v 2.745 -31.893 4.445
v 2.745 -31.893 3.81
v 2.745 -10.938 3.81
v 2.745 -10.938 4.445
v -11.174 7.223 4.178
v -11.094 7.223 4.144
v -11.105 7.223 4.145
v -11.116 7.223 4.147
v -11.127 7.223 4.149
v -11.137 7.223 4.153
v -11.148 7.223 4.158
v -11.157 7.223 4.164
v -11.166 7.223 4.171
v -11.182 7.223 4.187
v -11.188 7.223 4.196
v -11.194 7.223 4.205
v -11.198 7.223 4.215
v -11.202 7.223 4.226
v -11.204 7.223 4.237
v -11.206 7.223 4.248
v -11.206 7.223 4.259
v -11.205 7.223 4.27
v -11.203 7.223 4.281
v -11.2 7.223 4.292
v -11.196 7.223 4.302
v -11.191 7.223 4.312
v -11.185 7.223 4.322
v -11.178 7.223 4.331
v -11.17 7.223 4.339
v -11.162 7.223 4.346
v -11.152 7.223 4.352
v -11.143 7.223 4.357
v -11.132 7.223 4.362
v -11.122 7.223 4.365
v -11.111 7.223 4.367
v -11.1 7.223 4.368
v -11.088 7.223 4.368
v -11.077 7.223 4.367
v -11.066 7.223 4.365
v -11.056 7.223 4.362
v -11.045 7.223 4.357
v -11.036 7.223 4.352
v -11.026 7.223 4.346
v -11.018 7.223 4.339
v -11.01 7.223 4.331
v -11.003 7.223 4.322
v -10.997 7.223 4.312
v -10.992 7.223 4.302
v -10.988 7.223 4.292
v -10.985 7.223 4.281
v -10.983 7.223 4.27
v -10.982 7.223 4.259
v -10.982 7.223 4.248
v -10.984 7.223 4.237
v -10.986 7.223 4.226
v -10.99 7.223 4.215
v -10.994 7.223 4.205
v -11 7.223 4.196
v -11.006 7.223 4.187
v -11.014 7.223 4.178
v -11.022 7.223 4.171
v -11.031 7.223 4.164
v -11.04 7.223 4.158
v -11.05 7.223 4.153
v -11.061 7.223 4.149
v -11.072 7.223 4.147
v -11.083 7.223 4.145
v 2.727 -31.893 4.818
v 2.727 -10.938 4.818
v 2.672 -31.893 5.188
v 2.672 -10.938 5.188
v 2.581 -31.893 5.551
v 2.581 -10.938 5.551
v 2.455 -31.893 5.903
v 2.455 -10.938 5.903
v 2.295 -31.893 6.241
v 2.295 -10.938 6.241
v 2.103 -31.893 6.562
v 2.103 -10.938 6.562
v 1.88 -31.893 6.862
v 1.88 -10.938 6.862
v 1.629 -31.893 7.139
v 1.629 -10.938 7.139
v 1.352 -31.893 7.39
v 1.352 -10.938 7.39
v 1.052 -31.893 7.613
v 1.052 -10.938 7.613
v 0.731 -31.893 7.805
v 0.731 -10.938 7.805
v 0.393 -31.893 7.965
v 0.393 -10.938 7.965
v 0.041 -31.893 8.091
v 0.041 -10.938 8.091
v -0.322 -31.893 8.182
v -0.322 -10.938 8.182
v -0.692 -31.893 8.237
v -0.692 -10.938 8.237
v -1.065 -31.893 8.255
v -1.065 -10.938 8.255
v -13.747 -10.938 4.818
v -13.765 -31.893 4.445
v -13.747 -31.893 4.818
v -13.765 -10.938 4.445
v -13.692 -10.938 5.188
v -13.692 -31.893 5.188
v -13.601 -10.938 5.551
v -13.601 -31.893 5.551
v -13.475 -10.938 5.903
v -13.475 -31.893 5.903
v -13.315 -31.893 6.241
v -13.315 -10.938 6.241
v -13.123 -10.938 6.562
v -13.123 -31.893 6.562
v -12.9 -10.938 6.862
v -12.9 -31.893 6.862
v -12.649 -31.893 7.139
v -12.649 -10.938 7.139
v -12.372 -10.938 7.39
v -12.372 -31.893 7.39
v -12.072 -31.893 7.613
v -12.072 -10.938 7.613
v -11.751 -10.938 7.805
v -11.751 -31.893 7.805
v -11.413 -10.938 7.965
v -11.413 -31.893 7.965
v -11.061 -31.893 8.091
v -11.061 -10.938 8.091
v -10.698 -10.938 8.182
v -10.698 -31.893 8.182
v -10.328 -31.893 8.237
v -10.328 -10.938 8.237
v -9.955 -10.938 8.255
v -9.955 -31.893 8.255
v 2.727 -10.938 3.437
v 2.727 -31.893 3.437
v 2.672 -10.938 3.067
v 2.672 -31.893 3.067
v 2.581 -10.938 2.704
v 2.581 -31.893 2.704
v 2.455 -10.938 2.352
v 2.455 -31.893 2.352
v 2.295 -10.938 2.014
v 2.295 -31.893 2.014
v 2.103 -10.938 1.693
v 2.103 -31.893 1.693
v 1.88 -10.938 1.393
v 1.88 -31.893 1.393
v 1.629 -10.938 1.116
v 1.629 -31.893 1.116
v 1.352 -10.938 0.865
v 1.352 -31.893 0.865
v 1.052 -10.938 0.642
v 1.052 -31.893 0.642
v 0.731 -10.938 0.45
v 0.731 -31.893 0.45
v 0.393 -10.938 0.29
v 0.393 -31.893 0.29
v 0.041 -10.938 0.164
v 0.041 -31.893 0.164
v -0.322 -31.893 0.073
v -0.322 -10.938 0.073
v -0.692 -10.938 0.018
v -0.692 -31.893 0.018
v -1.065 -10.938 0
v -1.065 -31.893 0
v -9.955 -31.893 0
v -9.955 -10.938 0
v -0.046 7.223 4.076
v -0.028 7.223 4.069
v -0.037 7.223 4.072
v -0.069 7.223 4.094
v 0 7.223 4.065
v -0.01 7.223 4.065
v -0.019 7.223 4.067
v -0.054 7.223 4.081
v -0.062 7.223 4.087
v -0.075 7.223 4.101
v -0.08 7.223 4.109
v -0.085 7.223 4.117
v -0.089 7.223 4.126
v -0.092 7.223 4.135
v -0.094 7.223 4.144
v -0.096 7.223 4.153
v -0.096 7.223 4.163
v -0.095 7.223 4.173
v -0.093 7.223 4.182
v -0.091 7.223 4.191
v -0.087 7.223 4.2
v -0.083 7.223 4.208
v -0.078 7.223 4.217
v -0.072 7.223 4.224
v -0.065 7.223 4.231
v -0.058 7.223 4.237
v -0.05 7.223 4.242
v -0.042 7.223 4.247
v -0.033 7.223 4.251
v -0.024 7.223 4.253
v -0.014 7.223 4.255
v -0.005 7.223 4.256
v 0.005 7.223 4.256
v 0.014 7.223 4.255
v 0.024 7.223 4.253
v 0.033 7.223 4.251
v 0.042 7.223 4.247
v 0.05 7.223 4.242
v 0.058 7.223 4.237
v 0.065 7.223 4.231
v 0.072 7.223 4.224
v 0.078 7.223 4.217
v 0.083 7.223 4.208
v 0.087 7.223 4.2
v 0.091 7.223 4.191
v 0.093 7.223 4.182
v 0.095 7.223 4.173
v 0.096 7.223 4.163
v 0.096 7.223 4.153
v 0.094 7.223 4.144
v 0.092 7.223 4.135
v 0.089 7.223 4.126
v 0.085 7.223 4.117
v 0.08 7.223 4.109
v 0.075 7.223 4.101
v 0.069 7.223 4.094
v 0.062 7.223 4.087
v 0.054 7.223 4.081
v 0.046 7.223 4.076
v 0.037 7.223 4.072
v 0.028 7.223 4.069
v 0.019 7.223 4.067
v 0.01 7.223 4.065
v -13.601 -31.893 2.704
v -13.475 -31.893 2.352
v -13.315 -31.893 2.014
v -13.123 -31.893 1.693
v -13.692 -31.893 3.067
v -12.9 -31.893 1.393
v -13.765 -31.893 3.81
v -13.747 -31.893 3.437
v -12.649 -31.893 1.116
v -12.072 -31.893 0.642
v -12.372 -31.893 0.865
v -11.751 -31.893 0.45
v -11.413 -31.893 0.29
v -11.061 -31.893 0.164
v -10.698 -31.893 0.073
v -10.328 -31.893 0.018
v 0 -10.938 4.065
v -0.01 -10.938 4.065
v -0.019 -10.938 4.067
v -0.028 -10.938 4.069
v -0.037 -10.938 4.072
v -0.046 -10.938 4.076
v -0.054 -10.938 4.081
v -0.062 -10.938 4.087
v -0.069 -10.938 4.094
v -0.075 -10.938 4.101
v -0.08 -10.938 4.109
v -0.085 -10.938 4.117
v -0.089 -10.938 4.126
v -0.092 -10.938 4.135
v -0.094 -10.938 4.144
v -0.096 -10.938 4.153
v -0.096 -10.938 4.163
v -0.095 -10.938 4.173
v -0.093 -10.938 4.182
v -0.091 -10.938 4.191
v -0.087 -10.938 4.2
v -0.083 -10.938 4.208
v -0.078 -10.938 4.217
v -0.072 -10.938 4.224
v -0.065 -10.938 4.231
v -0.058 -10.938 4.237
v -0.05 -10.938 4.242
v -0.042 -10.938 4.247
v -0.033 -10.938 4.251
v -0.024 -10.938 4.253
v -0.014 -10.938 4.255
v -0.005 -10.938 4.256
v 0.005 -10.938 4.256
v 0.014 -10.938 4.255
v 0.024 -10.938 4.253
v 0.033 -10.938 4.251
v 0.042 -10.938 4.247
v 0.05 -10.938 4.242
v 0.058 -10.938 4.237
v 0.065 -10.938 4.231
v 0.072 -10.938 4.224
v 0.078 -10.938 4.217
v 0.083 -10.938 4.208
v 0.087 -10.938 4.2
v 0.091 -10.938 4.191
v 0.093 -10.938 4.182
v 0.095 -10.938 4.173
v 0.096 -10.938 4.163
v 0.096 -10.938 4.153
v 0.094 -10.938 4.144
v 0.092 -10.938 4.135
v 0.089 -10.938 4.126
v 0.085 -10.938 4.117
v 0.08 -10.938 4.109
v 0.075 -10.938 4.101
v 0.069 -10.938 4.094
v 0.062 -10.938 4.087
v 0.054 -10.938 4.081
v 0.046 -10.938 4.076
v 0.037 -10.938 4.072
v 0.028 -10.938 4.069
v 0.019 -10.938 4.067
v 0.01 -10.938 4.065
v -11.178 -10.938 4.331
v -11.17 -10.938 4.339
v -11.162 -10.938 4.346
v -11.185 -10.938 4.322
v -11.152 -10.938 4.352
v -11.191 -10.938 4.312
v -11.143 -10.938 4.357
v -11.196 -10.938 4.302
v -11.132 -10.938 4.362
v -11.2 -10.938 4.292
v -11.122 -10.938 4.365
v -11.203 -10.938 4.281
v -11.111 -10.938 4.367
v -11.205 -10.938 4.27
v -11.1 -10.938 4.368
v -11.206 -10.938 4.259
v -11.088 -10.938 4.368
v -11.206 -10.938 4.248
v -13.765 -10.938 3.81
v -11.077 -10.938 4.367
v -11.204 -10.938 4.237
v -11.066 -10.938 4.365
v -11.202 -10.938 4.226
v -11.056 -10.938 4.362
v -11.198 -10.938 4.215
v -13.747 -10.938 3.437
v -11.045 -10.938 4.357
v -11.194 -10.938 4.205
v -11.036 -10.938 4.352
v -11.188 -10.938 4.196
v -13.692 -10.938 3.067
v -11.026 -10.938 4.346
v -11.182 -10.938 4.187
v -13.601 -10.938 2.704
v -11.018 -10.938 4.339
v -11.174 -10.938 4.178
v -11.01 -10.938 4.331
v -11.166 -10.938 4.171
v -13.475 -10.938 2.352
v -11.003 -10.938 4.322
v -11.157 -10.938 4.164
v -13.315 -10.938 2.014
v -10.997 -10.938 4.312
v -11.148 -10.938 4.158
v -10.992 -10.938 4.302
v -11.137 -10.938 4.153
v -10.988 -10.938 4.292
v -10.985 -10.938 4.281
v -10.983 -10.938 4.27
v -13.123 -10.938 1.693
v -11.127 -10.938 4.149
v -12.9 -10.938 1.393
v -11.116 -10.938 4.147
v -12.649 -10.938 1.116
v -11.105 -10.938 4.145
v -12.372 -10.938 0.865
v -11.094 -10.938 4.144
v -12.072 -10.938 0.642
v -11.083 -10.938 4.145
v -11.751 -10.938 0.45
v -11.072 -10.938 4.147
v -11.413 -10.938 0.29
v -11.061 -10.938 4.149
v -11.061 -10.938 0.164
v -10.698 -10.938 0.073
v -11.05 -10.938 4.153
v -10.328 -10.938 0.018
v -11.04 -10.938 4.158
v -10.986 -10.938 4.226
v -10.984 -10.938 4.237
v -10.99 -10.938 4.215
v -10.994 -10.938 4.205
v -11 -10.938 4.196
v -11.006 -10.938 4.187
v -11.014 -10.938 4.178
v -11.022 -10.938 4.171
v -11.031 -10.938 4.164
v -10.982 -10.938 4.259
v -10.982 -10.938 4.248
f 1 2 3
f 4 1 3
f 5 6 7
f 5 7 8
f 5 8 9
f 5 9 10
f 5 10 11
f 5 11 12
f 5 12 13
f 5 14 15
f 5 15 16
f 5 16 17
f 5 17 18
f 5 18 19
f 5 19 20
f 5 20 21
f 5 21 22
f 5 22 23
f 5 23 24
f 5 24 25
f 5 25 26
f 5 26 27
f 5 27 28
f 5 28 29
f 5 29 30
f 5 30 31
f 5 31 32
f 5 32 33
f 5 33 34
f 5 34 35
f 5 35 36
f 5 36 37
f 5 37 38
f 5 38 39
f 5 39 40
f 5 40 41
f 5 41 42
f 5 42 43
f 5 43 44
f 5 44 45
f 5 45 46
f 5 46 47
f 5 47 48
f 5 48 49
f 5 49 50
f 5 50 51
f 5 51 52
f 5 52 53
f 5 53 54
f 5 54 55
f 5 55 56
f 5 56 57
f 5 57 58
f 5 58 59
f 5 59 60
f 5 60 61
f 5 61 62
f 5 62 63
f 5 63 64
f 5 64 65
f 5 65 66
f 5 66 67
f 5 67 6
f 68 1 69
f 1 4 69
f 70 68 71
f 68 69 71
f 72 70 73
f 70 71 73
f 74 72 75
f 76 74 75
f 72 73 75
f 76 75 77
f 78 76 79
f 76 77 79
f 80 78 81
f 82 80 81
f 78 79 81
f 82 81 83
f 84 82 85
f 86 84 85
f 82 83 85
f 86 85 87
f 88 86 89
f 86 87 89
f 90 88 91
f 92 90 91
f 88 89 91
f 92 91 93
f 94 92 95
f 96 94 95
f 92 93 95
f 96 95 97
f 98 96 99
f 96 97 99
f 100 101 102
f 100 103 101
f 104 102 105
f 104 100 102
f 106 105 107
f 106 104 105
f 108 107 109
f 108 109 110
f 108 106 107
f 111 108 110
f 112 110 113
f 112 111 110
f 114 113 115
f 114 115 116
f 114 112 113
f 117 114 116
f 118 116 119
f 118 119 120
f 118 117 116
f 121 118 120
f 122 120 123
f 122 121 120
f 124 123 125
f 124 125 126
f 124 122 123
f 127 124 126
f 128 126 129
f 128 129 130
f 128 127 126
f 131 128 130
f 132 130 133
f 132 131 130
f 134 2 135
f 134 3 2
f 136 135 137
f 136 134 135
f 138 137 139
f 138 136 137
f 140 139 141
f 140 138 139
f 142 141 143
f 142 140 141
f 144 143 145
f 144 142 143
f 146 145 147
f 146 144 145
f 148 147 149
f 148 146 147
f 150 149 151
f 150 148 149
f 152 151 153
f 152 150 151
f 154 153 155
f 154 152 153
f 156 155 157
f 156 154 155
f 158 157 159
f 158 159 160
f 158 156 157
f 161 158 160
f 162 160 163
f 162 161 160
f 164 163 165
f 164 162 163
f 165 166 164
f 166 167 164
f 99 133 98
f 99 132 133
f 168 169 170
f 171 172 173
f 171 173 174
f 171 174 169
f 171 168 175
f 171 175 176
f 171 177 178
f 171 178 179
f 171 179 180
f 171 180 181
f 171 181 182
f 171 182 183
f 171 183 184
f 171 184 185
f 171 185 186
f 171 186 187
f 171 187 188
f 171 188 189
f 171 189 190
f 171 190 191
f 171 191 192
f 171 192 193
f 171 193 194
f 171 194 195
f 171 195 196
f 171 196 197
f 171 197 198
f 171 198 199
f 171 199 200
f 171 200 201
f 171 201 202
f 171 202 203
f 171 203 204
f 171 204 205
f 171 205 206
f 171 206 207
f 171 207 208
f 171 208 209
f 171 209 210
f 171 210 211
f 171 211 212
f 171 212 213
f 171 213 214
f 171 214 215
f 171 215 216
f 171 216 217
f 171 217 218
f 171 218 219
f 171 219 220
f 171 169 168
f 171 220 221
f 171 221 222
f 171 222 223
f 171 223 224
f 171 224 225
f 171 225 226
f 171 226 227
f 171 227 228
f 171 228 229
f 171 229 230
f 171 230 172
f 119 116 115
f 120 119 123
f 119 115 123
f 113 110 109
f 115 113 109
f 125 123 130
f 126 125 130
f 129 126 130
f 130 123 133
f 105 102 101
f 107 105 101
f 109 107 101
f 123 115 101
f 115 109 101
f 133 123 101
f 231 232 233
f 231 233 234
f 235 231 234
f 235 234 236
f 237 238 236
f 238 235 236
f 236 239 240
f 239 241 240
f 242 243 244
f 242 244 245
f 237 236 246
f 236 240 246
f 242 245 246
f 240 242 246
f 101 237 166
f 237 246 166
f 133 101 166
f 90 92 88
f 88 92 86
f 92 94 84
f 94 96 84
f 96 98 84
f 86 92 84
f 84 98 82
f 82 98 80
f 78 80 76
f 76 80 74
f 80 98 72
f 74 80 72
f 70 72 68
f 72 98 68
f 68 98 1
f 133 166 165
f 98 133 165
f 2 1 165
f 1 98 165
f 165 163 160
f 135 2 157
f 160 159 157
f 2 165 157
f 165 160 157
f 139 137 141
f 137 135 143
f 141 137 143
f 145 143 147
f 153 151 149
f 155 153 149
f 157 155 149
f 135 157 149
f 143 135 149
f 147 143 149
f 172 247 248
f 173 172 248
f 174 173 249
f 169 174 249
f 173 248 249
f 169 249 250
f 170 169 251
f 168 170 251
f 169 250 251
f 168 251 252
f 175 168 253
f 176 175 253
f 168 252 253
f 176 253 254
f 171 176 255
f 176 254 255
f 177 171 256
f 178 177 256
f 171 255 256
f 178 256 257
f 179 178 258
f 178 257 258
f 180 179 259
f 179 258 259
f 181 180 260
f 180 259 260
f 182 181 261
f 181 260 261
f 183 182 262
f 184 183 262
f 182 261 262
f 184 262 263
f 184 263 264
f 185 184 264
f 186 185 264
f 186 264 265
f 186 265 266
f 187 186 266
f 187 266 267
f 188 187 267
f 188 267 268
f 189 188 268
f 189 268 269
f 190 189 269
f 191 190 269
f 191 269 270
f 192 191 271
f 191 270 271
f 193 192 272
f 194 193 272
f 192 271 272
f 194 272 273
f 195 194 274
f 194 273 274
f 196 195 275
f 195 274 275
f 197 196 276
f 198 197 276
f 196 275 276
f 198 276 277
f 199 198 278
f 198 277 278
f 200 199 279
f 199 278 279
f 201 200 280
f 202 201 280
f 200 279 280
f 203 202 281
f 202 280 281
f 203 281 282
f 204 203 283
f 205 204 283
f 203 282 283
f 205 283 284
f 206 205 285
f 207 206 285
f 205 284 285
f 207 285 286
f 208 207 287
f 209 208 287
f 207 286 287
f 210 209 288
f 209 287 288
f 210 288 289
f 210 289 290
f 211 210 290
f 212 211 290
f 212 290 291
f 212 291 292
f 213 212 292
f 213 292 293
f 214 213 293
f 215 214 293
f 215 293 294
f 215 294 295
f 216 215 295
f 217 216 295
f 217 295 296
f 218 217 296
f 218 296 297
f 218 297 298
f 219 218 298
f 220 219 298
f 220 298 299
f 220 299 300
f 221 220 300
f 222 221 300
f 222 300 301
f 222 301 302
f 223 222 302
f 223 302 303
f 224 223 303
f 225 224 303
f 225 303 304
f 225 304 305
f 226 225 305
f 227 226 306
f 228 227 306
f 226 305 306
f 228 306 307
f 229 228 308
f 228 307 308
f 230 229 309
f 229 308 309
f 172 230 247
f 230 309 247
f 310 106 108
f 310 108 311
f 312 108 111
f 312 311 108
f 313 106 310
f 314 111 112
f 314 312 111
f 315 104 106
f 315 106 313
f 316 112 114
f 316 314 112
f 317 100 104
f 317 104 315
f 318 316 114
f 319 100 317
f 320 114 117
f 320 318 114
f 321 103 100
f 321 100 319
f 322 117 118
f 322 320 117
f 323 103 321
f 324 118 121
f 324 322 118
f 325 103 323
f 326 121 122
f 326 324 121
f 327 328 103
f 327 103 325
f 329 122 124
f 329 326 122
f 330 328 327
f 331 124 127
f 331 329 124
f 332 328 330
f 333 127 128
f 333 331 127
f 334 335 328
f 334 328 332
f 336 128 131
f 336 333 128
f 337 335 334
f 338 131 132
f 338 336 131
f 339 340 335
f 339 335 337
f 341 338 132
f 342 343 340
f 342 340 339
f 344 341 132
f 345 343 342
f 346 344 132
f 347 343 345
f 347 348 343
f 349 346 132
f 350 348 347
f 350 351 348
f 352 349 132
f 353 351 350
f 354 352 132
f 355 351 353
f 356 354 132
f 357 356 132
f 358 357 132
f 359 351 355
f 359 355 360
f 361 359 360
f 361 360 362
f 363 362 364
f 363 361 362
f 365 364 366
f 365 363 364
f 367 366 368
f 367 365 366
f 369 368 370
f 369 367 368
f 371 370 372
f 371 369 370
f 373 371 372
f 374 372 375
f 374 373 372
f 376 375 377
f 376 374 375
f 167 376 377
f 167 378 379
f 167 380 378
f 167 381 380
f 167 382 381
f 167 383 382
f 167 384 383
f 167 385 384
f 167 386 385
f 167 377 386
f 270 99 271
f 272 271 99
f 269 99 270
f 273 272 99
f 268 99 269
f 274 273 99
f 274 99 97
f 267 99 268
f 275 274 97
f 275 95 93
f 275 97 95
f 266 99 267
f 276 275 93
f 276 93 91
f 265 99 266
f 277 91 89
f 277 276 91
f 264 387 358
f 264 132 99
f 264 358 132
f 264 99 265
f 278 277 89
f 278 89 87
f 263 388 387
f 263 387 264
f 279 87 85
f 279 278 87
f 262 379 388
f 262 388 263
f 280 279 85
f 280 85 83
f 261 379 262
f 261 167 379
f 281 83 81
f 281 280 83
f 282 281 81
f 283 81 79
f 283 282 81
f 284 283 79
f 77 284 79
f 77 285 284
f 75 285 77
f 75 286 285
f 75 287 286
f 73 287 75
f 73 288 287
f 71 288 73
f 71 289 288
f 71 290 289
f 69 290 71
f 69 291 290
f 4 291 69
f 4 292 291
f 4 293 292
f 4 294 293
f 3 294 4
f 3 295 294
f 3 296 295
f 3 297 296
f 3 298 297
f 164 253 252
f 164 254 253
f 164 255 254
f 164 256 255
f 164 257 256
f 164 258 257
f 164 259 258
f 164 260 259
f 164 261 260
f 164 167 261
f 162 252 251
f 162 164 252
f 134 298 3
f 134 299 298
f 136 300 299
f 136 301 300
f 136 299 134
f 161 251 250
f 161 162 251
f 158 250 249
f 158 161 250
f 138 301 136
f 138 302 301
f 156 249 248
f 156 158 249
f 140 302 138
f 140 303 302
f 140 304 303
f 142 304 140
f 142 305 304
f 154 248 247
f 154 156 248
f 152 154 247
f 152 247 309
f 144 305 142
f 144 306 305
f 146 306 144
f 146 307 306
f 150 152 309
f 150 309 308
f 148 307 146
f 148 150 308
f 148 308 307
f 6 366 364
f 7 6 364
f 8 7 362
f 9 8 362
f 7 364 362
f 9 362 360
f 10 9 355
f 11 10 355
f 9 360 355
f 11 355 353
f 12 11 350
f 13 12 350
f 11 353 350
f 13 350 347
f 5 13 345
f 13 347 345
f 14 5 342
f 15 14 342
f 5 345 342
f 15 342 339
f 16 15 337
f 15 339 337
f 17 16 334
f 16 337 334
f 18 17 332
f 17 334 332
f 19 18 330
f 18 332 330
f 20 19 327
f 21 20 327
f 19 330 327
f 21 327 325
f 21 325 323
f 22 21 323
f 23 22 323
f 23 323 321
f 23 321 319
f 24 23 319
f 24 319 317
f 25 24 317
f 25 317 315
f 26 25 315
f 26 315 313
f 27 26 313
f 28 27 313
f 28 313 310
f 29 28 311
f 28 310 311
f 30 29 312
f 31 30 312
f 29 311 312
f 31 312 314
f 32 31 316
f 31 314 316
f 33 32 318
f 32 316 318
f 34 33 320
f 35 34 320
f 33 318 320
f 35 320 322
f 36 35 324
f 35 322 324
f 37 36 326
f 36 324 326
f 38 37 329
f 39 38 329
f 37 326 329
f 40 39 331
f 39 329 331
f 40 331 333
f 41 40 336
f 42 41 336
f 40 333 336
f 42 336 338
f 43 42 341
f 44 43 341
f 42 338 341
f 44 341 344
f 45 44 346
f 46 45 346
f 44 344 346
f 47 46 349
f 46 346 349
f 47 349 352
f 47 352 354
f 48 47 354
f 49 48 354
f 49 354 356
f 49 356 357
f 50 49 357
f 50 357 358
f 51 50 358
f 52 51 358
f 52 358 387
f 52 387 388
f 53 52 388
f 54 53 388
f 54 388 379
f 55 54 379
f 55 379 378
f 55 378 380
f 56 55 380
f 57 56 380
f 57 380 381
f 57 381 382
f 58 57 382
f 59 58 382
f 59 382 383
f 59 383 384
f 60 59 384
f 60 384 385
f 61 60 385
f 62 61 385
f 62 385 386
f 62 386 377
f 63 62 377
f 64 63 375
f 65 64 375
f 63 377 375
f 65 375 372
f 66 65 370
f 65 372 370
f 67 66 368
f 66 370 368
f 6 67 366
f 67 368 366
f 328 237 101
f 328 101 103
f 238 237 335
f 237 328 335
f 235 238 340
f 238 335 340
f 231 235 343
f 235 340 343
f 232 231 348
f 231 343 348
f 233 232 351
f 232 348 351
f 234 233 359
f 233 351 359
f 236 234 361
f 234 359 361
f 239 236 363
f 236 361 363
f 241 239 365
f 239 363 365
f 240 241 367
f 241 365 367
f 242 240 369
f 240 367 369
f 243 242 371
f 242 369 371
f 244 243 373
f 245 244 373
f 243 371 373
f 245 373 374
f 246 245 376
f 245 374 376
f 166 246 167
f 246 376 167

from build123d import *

# Parameters (mm, degrees)
SKETCH1_W           = 16.51
SKETCH1_H           = 20.955
BOSS_EXTRUDE1_DEPTH = 8.255
FILLET1_R           = 3.81
SKETCH2_R           = 0.095779186
SKETCH2_R_2         = 0.11203659
BOSS_EXTRUDE2_DEPTH = 18.161


with BuildPart() as part:
    # Sketch1 → Boss-Extrude1 (new body)
    with BuildSketch(Plane.XY):
        with Locations((-5.510011418, -21.415196798)):
            Rectangle(SKETCH1_W, SKETCH1_H)
    extrude(amount=BOSS_EXTRUDE1_DEPTH)

    # Fillet1
    fillet1_edges = [part.edges().sort_by_distance(p)[0] for p in [
        (-13.765011418, -21.415196798, 8.255),
        (2.744988582, -21.415196798, 8.255),
        (-13.765011418, -21.415196798, 0),
        (2.744988582, -21.415196798, 0),
    ]]
    fillet(fillet1_edges, radius=FILLET1_R)

    # Sketch2 → Boss-Extrude2 (add)
    with BuildSketch(Plane(origin=(0, -10.937696798, 0), x_dir=(1, 0, 0), z_dir=(0, 1, 0))):
        with Locations(Location((0, -4.160603471, 0), (0, 0, 90))):  # turned: the seam where the file's is
            Circle(SKETCH2_R)
        with Locations(Location((-11.093960289, -4.256382657, 0), (0, 0, 90))):  # turned: the seam where the file's is
            Circle(SKETCH2_R_2)
    extrude(amount=BOSS_EXTRUDE2_DEPTH)


solid = part.part
